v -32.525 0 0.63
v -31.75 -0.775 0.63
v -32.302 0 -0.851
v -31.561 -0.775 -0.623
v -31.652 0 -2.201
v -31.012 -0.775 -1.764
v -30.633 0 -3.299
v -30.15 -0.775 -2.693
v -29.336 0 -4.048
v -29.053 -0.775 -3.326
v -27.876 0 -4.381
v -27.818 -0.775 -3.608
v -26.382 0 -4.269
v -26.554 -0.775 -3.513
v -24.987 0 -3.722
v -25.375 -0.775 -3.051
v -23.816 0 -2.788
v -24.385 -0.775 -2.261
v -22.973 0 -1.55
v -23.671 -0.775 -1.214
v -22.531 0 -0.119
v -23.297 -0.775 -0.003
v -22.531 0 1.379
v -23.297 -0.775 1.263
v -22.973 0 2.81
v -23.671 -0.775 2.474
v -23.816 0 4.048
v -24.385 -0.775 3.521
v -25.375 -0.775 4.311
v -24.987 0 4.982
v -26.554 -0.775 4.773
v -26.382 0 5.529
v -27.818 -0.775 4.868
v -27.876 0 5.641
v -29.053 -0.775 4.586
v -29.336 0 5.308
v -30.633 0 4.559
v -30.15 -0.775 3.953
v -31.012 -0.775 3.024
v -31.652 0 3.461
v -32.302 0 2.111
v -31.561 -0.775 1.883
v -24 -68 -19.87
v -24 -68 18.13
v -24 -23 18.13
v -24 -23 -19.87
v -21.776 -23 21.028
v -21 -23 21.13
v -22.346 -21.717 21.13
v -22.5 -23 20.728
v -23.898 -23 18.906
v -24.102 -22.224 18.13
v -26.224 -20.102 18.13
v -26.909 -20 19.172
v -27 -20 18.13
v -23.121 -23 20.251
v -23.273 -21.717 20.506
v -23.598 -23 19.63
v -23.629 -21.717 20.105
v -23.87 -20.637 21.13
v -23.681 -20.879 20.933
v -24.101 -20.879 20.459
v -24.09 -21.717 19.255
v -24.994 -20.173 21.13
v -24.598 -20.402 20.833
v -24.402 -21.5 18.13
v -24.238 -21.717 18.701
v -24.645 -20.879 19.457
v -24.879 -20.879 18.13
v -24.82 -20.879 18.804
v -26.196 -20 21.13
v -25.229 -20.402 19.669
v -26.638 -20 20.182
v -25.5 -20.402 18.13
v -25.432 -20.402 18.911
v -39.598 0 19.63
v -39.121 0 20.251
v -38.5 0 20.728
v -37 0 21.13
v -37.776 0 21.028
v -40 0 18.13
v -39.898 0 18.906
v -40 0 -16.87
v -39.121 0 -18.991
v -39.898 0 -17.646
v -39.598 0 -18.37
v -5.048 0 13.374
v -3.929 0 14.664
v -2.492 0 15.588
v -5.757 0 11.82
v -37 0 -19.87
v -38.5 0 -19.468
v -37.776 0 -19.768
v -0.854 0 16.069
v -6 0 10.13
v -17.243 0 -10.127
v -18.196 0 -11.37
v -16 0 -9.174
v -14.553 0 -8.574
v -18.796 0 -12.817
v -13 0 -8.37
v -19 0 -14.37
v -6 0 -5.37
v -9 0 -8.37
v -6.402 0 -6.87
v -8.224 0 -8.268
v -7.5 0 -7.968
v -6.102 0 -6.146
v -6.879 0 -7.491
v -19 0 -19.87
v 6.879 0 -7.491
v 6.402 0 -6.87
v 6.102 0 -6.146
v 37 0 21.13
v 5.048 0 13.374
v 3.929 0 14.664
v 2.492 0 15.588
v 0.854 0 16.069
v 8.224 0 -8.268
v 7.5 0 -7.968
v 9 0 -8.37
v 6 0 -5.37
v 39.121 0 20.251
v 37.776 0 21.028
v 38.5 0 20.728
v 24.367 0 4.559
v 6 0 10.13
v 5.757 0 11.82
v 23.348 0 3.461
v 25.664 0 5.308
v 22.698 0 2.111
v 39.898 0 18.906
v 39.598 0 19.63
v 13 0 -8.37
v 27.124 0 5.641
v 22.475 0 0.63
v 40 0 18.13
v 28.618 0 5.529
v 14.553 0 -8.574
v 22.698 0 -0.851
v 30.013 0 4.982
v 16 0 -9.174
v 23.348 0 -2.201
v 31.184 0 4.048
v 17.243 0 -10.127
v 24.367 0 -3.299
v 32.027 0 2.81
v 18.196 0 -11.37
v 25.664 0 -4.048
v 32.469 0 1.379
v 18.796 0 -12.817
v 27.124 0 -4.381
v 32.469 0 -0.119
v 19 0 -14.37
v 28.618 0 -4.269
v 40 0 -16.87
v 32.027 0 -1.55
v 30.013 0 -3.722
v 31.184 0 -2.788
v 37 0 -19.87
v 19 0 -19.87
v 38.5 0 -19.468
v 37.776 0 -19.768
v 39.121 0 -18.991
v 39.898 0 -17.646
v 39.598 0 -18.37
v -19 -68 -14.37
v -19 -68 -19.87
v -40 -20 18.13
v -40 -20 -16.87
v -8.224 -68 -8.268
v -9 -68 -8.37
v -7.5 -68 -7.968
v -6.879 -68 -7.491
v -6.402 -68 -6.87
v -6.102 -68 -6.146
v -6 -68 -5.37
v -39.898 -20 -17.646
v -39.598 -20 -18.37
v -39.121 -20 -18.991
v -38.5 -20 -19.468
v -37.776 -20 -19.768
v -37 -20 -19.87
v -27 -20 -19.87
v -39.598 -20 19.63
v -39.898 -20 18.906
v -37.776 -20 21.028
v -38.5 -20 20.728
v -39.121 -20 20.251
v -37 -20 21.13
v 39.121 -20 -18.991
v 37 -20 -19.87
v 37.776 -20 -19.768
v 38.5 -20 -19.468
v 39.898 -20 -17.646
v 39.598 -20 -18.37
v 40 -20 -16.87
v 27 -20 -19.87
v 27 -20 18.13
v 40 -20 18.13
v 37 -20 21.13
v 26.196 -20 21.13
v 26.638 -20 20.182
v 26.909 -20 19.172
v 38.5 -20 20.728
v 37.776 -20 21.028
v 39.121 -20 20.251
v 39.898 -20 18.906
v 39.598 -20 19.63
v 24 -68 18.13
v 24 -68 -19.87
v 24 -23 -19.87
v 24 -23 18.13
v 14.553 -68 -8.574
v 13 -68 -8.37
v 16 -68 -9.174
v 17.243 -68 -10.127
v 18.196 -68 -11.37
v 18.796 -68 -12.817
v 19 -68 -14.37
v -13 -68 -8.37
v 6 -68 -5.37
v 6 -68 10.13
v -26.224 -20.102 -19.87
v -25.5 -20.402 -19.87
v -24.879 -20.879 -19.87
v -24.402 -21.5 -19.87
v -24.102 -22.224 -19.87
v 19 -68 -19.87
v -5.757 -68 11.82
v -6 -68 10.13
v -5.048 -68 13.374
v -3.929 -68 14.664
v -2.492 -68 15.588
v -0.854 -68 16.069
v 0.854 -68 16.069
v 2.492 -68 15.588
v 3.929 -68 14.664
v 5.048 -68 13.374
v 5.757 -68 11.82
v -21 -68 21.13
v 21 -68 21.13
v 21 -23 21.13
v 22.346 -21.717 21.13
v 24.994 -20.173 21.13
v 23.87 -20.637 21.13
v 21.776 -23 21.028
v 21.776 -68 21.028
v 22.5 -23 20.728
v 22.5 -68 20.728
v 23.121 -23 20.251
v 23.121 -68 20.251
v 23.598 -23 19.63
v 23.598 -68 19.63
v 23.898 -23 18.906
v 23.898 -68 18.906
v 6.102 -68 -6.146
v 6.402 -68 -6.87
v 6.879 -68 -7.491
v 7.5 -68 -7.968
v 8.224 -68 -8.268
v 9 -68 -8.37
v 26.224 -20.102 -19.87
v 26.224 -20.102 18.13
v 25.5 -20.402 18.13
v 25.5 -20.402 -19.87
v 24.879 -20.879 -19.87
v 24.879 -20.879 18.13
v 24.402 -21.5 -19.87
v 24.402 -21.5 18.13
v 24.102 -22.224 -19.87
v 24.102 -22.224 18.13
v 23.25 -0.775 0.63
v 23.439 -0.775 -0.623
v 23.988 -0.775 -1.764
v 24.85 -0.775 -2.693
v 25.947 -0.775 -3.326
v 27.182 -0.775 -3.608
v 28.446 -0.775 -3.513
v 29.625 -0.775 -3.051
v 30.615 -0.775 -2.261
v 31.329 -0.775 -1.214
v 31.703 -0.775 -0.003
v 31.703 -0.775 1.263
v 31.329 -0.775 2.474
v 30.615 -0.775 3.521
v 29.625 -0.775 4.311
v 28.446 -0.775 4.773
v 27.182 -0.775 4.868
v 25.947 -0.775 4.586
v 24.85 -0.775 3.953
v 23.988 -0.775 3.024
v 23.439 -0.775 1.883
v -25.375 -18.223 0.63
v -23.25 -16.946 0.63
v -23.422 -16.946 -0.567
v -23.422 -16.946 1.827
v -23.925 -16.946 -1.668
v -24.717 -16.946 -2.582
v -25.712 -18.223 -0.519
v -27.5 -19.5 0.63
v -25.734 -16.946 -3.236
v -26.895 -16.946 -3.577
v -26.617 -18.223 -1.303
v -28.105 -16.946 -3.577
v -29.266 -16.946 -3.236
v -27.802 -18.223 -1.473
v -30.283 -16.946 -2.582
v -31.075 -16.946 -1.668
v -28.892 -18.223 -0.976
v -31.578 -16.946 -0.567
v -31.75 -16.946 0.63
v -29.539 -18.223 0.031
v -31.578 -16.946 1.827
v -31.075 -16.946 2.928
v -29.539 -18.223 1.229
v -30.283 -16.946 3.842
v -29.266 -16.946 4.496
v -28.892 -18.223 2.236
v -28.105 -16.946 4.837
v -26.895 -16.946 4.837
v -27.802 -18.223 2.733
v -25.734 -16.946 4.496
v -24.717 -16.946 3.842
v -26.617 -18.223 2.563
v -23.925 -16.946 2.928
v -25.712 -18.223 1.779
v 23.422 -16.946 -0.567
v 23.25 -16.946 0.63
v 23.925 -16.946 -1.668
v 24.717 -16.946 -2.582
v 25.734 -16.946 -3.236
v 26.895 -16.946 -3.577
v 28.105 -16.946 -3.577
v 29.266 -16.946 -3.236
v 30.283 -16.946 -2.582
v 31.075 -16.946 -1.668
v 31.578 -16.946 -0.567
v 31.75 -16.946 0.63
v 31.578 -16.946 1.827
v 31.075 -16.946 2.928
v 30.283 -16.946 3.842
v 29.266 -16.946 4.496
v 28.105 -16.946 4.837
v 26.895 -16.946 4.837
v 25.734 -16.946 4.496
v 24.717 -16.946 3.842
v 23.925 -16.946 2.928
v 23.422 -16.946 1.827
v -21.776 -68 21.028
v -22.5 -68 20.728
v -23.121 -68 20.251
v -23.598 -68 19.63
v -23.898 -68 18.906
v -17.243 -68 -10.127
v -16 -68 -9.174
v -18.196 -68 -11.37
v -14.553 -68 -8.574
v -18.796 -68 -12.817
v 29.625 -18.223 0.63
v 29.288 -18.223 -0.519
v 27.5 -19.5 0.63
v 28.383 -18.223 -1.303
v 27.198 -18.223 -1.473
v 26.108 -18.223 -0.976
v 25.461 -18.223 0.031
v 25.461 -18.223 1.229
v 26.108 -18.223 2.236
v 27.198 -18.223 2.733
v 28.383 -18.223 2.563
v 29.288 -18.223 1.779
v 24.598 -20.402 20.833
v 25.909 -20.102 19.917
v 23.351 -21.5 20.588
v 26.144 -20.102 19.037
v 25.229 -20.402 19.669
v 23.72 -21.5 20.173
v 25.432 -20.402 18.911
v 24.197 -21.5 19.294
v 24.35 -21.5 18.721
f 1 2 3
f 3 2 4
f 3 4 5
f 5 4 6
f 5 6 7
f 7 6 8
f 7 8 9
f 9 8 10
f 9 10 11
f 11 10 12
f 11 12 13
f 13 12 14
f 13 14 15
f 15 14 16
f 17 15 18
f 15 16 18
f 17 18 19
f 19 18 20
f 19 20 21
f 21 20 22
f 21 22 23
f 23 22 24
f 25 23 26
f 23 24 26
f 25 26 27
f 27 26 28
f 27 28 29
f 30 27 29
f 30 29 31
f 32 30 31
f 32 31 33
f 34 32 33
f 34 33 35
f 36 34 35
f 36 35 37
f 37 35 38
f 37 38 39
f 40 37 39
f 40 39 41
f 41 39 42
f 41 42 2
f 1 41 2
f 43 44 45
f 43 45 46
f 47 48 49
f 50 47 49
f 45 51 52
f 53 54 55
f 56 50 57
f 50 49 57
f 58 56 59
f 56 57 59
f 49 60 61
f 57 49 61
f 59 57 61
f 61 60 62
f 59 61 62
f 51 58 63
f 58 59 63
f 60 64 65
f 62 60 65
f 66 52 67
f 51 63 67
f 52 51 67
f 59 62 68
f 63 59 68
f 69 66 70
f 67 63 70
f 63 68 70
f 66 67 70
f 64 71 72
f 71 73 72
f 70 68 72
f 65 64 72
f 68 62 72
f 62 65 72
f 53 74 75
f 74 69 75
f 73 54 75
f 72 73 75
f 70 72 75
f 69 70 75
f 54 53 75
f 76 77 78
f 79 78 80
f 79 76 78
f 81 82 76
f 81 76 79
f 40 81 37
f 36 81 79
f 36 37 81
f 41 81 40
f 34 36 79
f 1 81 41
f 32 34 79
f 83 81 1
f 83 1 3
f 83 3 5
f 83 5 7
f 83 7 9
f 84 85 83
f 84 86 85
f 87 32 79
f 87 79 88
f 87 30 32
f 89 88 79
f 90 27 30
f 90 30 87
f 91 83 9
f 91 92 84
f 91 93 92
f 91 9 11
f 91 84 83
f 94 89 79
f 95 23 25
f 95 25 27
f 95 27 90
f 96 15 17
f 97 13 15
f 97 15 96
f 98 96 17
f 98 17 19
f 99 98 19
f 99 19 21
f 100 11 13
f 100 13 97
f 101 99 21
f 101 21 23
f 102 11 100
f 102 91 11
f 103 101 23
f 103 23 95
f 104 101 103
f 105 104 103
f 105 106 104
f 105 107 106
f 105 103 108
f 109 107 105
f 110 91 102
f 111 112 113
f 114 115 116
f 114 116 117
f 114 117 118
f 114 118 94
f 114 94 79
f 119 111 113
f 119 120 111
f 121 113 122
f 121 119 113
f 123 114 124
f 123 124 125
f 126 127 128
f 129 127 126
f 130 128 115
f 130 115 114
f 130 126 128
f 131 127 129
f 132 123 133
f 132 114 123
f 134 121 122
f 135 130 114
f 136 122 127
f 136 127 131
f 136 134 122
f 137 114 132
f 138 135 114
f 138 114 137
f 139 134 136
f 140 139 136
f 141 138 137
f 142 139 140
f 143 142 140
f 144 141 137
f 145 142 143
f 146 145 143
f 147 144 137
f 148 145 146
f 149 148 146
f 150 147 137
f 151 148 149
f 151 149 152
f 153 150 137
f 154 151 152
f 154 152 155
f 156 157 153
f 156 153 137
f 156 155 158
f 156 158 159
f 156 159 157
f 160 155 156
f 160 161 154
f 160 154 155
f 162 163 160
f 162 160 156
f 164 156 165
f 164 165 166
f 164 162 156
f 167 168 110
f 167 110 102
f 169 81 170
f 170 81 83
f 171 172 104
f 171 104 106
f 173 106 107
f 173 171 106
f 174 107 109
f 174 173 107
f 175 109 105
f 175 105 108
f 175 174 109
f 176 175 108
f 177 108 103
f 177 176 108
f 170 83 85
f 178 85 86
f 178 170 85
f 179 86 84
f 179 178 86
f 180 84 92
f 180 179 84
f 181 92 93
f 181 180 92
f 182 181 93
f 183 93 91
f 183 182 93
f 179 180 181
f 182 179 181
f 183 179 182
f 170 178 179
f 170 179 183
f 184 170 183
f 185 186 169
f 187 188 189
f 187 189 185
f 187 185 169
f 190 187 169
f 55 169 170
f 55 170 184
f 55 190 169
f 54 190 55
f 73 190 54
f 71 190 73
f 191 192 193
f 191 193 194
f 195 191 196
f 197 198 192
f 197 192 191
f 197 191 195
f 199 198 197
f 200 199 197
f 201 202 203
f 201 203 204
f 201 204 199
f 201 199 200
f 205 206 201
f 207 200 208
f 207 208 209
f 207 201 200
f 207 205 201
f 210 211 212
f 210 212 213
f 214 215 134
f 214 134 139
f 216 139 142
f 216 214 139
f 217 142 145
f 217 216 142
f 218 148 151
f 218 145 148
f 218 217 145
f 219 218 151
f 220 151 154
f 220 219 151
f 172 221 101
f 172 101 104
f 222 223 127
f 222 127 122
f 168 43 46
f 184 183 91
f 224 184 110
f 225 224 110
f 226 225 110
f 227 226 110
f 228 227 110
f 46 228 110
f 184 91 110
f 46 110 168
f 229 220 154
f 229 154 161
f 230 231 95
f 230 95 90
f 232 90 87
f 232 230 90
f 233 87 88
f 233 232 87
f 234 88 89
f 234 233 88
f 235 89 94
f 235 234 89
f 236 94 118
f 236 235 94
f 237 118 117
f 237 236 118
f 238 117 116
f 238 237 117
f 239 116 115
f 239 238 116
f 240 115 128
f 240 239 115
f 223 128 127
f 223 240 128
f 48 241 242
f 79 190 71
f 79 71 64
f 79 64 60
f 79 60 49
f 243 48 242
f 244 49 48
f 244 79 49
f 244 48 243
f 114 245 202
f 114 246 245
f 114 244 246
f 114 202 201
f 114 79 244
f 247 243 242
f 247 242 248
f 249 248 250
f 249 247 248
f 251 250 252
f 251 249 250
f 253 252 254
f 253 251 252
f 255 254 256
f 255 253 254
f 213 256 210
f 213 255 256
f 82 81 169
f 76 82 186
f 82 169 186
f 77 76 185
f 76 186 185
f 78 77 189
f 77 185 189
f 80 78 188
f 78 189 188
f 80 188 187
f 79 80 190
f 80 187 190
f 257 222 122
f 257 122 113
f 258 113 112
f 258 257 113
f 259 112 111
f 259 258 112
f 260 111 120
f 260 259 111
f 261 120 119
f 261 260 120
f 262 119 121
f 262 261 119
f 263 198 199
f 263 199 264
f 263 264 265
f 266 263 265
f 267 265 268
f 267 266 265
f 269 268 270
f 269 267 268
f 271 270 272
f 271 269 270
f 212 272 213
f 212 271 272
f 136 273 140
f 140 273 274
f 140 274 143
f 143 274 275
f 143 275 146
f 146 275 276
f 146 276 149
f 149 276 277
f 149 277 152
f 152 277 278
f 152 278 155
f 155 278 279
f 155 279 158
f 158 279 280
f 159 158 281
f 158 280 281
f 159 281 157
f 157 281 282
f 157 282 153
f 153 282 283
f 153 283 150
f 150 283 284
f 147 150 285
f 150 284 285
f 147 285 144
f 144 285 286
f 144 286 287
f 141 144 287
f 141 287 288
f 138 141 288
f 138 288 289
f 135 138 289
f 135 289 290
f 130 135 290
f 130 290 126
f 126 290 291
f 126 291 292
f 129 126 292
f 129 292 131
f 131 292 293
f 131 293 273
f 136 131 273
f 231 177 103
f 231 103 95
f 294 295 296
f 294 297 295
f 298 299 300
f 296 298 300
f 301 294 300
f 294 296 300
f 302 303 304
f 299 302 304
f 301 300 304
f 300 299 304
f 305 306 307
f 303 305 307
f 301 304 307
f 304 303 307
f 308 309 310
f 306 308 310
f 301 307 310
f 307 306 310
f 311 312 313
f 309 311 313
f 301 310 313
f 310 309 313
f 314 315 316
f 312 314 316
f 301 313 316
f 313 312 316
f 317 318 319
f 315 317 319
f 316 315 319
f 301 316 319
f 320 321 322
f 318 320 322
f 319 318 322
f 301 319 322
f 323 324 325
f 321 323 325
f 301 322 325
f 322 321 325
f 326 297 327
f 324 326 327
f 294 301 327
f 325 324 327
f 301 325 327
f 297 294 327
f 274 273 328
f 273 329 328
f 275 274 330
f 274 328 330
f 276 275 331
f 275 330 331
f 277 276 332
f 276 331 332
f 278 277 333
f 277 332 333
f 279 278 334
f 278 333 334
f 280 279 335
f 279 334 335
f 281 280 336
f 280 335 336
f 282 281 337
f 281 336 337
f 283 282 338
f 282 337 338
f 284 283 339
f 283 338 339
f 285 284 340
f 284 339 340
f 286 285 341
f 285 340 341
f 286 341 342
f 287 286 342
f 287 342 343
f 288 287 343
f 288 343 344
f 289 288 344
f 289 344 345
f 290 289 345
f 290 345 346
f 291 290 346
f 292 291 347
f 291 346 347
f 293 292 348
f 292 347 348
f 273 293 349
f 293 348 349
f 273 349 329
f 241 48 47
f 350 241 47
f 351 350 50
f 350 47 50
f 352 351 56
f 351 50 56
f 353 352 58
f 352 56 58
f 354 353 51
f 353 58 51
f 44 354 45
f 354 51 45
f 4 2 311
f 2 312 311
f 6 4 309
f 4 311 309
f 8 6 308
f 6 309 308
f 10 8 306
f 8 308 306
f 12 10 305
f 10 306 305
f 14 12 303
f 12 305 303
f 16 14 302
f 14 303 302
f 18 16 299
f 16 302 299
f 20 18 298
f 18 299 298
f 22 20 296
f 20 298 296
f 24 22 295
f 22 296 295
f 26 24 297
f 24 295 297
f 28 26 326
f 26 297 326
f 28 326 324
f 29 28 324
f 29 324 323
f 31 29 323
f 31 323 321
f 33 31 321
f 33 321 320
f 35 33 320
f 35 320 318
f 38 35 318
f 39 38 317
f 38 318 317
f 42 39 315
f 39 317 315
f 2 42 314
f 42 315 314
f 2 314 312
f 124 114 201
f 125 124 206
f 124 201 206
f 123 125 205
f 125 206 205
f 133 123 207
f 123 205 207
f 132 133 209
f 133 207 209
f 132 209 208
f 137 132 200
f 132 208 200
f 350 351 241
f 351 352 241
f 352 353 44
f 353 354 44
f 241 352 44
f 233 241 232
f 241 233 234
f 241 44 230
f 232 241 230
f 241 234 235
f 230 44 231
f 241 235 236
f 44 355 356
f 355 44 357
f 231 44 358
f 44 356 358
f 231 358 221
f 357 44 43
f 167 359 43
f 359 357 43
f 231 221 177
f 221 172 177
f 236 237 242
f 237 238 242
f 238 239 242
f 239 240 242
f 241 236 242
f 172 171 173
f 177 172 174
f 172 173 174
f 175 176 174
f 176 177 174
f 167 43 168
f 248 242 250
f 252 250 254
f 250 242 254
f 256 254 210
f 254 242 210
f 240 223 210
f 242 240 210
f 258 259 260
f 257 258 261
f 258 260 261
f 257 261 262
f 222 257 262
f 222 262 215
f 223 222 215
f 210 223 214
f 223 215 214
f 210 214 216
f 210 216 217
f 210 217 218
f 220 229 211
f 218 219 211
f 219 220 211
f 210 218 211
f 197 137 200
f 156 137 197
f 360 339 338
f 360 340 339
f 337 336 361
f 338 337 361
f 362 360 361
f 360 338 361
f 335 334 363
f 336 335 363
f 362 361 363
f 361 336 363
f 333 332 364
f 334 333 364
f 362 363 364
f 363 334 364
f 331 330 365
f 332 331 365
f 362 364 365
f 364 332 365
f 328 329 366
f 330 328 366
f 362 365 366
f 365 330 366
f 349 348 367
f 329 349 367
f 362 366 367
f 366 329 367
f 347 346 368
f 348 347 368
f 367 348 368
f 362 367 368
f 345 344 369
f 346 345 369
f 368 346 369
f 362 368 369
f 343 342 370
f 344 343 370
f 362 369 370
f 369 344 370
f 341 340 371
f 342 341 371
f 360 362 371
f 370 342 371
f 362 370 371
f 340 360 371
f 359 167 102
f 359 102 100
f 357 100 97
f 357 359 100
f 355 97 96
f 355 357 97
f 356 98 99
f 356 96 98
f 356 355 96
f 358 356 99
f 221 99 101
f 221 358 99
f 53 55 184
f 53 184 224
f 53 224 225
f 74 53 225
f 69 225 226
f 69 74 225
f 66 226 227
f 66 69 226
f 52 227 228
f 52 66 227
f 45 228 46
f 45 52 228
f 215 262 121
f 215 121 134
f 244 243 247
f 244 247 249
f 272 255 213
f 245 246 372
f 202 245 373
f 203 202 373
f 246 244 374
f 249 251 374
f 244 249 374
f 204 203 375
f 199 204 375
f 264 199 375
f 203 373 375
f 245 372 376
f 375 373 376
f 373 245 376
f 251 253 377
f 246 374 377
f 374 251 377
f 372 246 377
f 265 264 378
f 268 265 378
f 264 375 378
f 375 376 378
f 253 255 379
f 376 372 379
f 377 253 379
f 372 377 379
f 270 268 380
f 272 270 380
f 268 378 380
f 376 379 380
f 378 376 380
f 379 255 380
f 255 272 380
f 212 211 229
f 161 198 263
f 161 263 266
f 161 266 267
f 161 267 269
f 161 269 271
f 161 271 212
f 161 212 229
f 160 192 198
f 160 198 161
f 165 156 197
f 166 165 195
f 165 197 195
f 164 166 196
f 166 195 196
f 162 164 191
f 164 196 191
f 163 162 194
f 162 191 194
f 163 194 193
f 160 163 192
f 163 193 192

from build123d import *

# Parameters (mm, degrees)
SKETCH2_W                    = 80
SKETCH2_H                    = 41
BOSS_EXTRUDE1_DEPTH          = 68
FILLET1_R                    = 3
SKETCH5_OUTSIDE_W            = 104.544
SKETCH5_OUTSIDE_H            = 65.544
CUT_EXTRUDE2_DEPTH           = 48
CUT_EXTRUDE3_DEPTH           = 82.672987579
FILLET2_R                    = 3
FILLET3_R                    = 3
M10_TAPPED_HOLE1_D           = 8.5
M10_TAPPED_HOLE1_DEPTH       = 16.946342369
M10_TAPPED_HOLE1_CSINK_D     = 10.05
M10_TAPPED_HOLE1_CSINK_ANGLE = 90
M10_TAPPED_HOLE1_TIP         = 2.553657631


with BuildPart() as part:
    # Sketch2 → Boss-Extrude1 (new body)
    with BuildSketch(Plane(origin=(0, 0, 0), x_dir=(1, 0, 0), z_dir=(0, 1, 0))):
        with Locations((0, -0.63)):
            Rectangle(SKETCH2_W, SKETCH2_H)
    extrude(amount=-BOSS_EXTRUDE1_DEPTH)

    # Fillet1
    fillet1_edges = [part.edges().sort_by_distance(p)[0] for p in [
        (40, -34, 21.13),
        (-40, -34, 21.13),
        (-40, -34, -19.87),
        (40, -34, -19.87),
    ]]
    fillet(fillet1_edges, radius=FILLET1_R)

    # Sketch5 outside → Cut-Extrude2 (cut)
    with BuildSketch(Plane.XZ.offset(68)):
        with Locations((0, 0.63)):
            Rectangle(SKETCH5_OUTSIDE_W, SKETCH5_OUTSIDE_H)
        with BuildLine():
            Line((19, -19.87), (24, -19.87))
            Line((24, -19.87), (24, 21.13))
            Line((24, 21.13), (-24, 21.13))
            Line((-24, 21.13), (-24, -19.87))
            Line((-24, -19.87), (-19, -19.87))
            Line((-19, -19.87), (-19, -14.37))
            ThreePointArc((-19, -14.37), (-17.242640687, -10.127359313), (-13, -8.37))
            Line((-13, -8.37), (-9, -8.37))
            ThreePointArc((-9, -8.37), (-6.878679656, -7.491320344), (-6, -5.37))
            Line((-6, -5.37), (-6, 10.13))
            ThreePointArc((-6, 10.13), (0, 16.13), (6, 10.13))
            Line((6, 10.13), (6, -5.37))
            ThreePointArc((6, -5.37), (6.878679656, -7.491320344), (9, -8.37))
            Line((9, -8.37), (13, -8.37))
            ThreePointArc((13, -8.37), (17.242640687, -10.127359313), (19, -14.37))
            Line((19, -14.37), (19, -19.87))
        make_face(mode=Mode.SUBTRACT)
    extrude(amount=-CUT_EXTRUDE2_DEPTH, mode=Mode.SUBTRACT)

    # Sketch6 → Cut-Extrude3 (cut, through all)
    with BuildSketch(Plane.XZ.offset(68)):
        with BuildLine():
            Line((-13, -8.37), (-9, -8.37))
            ThreePointArc((-9, -8.37), (-6.878679656, -7.491320344), (-6, -5.37))
            Line((-6, -5.37), (-6, 10.13))
            ThreePointArc((-6, 10.13), (0, 16.13), (6, 10.13))
            Line((6, 10.13), (6, -5.37))
            ThreePointArc((6, -5.37), (6.878679656, -7.491320344), (9, -8.37))
            Line((9, -8.37), (13, -8.37))
            ThreePointArc((13, -8.37), (17.242640687, -10.127359313), (19, -14.37))
            Line((19, -14.37), (19, -19.87))
            Line((19, -19.87), (-19, -19.87))
            Line((-19, -19.87), (-19, -14.37))
            ThreePointArc((-19, -14.37), (-17.242640687, -10.127359313), (-13, -8.37))
        make_face()
    extrude(amount=-CUT_EXTRUDE3_DEPTH, mode=Mode.SUBTRACT)

    # Fillet2
    fillet2_edges = [part.edges().sort_by_distance(p)[0] for p in [
        (24, -44, 21.13),
        (-24, -44, 21.13),
    ]]
    fillet(fillet2_edges, radius=FILLET2_R)

    # Fillet3
    # the kernel refuses this fillet: 3 mm, written as the material it adds along each edge
    with BuildSketch(Plane(origin=(24, -20, -19.87), x_dir=(0, -1, 0), z_dir=(0, 0, 1)), Plane(origin=(-24, -20, 18.13), x_dir=(0, -1, 0), z_dir=(0, 0, -1))) as fillet3_piece_1:
        with BuildLine():
            CenterArc((FILLET3_R, FILLET3_R), FILLET3_R, 180, 90)
            Line((0, FILLET3_R), (0, 0))
            Line((0, 0), (FILLET3_R, 0))
        make_face()
    extrude(amount=38)
    with BuildSketch(Plane(origin=(-21, -20, 18.13), x_dir=(0.5976672776328279, 0, -0.801744239297648), z_dir=(-0.801744239297648, 0, -0.5976672776328279))) as fillet3_piece_2_section:
        with BuildLine():
            CenterArc((3 + FILLET3_R, FILLET3_R), FILLET3_R, 180, 90)
            Line((3 + FILLET3_R, 0), (3, 0))
            Line((3, 0), (3, FILLET3_R))
        make_face()
    fillet3_piece_2 = revolve(axis=Axis((-21, -20, 18.13), (0, -1, 0)), revolution_arc=233.296989237, mode=Mode.PRIVATE)
    fillet3_piece_2 = split(fillet3_piece_2, bisect_by=Plane(origin=(-23.249816778, -20.934885373, 21.13), z_dir=(0, 0, -1)), keep=Keep.TOP, mode=Mode.PRIVATE)
    add(fillet3_piece_2)
    with BuildSketch(Plane(origin=(21, -20, 18.13), x_dir=(-0.5976672776328279, 0, -0.801744239297648), z_dir=(0.801744239297648, 0, -0.5976672776328279))) as fillet3_piece_3_section:
        with BuildLine():
            CenterArc((3 + FILLET3_R, -FILLET3_R), FILLET3_R, 90, 90)
            Line((3, -FILLET3_R), (3, 0))
            Line((3, 0), (3 + FILLET3_R, 0))
        make_face()
    fillet3_piece_3 = revolve(axis=Axis((21, -20, 18.13), (0, 1, 0)), revolution_arc=233.296989237, mode=Mode.PRIVATE)
    fillet3_piece_3 = split(fillet3_piece_3, bisect_by=Plane(origin=(23.249816872, -20.934884795, 21.13), z_dir=(0, 0, -1)), keep=Keep.TOP, mode=Mode.PRIVATE)
    add(fillet3_piece_3)

    # M10 Tapped Hole1
    with Locations(Plane(origin=(0, 0, 0), x_dir=(1, 0, 0), z_dir=(0, 1, 0))):
        with Locations((27.5, -0.63), (-27.5, -0.63)):
            CounterSinkHole(M10_TAPPED_HOLE1_D / 2, M10_TAPPED_HOLE1_CSINK_D / 2, depth=M10_TAPPED_HOLE1_DEPTH, counter_sink_angle=M10_TAPPED_HOLE1_CSINK_ANGLE)
            with Locations((0, 0, -(M10_TAPPED_HOLE1_DEPTH + M10_TAPPED_HOLE1_TIP / 2))):  # 118° drill point
                Cone(0, M10_TAPPED_HOLE1_D / 2, M10_TAPPED_HOLE1_TIP, mode=Mode.SUBTRACT)


solid = part.part
